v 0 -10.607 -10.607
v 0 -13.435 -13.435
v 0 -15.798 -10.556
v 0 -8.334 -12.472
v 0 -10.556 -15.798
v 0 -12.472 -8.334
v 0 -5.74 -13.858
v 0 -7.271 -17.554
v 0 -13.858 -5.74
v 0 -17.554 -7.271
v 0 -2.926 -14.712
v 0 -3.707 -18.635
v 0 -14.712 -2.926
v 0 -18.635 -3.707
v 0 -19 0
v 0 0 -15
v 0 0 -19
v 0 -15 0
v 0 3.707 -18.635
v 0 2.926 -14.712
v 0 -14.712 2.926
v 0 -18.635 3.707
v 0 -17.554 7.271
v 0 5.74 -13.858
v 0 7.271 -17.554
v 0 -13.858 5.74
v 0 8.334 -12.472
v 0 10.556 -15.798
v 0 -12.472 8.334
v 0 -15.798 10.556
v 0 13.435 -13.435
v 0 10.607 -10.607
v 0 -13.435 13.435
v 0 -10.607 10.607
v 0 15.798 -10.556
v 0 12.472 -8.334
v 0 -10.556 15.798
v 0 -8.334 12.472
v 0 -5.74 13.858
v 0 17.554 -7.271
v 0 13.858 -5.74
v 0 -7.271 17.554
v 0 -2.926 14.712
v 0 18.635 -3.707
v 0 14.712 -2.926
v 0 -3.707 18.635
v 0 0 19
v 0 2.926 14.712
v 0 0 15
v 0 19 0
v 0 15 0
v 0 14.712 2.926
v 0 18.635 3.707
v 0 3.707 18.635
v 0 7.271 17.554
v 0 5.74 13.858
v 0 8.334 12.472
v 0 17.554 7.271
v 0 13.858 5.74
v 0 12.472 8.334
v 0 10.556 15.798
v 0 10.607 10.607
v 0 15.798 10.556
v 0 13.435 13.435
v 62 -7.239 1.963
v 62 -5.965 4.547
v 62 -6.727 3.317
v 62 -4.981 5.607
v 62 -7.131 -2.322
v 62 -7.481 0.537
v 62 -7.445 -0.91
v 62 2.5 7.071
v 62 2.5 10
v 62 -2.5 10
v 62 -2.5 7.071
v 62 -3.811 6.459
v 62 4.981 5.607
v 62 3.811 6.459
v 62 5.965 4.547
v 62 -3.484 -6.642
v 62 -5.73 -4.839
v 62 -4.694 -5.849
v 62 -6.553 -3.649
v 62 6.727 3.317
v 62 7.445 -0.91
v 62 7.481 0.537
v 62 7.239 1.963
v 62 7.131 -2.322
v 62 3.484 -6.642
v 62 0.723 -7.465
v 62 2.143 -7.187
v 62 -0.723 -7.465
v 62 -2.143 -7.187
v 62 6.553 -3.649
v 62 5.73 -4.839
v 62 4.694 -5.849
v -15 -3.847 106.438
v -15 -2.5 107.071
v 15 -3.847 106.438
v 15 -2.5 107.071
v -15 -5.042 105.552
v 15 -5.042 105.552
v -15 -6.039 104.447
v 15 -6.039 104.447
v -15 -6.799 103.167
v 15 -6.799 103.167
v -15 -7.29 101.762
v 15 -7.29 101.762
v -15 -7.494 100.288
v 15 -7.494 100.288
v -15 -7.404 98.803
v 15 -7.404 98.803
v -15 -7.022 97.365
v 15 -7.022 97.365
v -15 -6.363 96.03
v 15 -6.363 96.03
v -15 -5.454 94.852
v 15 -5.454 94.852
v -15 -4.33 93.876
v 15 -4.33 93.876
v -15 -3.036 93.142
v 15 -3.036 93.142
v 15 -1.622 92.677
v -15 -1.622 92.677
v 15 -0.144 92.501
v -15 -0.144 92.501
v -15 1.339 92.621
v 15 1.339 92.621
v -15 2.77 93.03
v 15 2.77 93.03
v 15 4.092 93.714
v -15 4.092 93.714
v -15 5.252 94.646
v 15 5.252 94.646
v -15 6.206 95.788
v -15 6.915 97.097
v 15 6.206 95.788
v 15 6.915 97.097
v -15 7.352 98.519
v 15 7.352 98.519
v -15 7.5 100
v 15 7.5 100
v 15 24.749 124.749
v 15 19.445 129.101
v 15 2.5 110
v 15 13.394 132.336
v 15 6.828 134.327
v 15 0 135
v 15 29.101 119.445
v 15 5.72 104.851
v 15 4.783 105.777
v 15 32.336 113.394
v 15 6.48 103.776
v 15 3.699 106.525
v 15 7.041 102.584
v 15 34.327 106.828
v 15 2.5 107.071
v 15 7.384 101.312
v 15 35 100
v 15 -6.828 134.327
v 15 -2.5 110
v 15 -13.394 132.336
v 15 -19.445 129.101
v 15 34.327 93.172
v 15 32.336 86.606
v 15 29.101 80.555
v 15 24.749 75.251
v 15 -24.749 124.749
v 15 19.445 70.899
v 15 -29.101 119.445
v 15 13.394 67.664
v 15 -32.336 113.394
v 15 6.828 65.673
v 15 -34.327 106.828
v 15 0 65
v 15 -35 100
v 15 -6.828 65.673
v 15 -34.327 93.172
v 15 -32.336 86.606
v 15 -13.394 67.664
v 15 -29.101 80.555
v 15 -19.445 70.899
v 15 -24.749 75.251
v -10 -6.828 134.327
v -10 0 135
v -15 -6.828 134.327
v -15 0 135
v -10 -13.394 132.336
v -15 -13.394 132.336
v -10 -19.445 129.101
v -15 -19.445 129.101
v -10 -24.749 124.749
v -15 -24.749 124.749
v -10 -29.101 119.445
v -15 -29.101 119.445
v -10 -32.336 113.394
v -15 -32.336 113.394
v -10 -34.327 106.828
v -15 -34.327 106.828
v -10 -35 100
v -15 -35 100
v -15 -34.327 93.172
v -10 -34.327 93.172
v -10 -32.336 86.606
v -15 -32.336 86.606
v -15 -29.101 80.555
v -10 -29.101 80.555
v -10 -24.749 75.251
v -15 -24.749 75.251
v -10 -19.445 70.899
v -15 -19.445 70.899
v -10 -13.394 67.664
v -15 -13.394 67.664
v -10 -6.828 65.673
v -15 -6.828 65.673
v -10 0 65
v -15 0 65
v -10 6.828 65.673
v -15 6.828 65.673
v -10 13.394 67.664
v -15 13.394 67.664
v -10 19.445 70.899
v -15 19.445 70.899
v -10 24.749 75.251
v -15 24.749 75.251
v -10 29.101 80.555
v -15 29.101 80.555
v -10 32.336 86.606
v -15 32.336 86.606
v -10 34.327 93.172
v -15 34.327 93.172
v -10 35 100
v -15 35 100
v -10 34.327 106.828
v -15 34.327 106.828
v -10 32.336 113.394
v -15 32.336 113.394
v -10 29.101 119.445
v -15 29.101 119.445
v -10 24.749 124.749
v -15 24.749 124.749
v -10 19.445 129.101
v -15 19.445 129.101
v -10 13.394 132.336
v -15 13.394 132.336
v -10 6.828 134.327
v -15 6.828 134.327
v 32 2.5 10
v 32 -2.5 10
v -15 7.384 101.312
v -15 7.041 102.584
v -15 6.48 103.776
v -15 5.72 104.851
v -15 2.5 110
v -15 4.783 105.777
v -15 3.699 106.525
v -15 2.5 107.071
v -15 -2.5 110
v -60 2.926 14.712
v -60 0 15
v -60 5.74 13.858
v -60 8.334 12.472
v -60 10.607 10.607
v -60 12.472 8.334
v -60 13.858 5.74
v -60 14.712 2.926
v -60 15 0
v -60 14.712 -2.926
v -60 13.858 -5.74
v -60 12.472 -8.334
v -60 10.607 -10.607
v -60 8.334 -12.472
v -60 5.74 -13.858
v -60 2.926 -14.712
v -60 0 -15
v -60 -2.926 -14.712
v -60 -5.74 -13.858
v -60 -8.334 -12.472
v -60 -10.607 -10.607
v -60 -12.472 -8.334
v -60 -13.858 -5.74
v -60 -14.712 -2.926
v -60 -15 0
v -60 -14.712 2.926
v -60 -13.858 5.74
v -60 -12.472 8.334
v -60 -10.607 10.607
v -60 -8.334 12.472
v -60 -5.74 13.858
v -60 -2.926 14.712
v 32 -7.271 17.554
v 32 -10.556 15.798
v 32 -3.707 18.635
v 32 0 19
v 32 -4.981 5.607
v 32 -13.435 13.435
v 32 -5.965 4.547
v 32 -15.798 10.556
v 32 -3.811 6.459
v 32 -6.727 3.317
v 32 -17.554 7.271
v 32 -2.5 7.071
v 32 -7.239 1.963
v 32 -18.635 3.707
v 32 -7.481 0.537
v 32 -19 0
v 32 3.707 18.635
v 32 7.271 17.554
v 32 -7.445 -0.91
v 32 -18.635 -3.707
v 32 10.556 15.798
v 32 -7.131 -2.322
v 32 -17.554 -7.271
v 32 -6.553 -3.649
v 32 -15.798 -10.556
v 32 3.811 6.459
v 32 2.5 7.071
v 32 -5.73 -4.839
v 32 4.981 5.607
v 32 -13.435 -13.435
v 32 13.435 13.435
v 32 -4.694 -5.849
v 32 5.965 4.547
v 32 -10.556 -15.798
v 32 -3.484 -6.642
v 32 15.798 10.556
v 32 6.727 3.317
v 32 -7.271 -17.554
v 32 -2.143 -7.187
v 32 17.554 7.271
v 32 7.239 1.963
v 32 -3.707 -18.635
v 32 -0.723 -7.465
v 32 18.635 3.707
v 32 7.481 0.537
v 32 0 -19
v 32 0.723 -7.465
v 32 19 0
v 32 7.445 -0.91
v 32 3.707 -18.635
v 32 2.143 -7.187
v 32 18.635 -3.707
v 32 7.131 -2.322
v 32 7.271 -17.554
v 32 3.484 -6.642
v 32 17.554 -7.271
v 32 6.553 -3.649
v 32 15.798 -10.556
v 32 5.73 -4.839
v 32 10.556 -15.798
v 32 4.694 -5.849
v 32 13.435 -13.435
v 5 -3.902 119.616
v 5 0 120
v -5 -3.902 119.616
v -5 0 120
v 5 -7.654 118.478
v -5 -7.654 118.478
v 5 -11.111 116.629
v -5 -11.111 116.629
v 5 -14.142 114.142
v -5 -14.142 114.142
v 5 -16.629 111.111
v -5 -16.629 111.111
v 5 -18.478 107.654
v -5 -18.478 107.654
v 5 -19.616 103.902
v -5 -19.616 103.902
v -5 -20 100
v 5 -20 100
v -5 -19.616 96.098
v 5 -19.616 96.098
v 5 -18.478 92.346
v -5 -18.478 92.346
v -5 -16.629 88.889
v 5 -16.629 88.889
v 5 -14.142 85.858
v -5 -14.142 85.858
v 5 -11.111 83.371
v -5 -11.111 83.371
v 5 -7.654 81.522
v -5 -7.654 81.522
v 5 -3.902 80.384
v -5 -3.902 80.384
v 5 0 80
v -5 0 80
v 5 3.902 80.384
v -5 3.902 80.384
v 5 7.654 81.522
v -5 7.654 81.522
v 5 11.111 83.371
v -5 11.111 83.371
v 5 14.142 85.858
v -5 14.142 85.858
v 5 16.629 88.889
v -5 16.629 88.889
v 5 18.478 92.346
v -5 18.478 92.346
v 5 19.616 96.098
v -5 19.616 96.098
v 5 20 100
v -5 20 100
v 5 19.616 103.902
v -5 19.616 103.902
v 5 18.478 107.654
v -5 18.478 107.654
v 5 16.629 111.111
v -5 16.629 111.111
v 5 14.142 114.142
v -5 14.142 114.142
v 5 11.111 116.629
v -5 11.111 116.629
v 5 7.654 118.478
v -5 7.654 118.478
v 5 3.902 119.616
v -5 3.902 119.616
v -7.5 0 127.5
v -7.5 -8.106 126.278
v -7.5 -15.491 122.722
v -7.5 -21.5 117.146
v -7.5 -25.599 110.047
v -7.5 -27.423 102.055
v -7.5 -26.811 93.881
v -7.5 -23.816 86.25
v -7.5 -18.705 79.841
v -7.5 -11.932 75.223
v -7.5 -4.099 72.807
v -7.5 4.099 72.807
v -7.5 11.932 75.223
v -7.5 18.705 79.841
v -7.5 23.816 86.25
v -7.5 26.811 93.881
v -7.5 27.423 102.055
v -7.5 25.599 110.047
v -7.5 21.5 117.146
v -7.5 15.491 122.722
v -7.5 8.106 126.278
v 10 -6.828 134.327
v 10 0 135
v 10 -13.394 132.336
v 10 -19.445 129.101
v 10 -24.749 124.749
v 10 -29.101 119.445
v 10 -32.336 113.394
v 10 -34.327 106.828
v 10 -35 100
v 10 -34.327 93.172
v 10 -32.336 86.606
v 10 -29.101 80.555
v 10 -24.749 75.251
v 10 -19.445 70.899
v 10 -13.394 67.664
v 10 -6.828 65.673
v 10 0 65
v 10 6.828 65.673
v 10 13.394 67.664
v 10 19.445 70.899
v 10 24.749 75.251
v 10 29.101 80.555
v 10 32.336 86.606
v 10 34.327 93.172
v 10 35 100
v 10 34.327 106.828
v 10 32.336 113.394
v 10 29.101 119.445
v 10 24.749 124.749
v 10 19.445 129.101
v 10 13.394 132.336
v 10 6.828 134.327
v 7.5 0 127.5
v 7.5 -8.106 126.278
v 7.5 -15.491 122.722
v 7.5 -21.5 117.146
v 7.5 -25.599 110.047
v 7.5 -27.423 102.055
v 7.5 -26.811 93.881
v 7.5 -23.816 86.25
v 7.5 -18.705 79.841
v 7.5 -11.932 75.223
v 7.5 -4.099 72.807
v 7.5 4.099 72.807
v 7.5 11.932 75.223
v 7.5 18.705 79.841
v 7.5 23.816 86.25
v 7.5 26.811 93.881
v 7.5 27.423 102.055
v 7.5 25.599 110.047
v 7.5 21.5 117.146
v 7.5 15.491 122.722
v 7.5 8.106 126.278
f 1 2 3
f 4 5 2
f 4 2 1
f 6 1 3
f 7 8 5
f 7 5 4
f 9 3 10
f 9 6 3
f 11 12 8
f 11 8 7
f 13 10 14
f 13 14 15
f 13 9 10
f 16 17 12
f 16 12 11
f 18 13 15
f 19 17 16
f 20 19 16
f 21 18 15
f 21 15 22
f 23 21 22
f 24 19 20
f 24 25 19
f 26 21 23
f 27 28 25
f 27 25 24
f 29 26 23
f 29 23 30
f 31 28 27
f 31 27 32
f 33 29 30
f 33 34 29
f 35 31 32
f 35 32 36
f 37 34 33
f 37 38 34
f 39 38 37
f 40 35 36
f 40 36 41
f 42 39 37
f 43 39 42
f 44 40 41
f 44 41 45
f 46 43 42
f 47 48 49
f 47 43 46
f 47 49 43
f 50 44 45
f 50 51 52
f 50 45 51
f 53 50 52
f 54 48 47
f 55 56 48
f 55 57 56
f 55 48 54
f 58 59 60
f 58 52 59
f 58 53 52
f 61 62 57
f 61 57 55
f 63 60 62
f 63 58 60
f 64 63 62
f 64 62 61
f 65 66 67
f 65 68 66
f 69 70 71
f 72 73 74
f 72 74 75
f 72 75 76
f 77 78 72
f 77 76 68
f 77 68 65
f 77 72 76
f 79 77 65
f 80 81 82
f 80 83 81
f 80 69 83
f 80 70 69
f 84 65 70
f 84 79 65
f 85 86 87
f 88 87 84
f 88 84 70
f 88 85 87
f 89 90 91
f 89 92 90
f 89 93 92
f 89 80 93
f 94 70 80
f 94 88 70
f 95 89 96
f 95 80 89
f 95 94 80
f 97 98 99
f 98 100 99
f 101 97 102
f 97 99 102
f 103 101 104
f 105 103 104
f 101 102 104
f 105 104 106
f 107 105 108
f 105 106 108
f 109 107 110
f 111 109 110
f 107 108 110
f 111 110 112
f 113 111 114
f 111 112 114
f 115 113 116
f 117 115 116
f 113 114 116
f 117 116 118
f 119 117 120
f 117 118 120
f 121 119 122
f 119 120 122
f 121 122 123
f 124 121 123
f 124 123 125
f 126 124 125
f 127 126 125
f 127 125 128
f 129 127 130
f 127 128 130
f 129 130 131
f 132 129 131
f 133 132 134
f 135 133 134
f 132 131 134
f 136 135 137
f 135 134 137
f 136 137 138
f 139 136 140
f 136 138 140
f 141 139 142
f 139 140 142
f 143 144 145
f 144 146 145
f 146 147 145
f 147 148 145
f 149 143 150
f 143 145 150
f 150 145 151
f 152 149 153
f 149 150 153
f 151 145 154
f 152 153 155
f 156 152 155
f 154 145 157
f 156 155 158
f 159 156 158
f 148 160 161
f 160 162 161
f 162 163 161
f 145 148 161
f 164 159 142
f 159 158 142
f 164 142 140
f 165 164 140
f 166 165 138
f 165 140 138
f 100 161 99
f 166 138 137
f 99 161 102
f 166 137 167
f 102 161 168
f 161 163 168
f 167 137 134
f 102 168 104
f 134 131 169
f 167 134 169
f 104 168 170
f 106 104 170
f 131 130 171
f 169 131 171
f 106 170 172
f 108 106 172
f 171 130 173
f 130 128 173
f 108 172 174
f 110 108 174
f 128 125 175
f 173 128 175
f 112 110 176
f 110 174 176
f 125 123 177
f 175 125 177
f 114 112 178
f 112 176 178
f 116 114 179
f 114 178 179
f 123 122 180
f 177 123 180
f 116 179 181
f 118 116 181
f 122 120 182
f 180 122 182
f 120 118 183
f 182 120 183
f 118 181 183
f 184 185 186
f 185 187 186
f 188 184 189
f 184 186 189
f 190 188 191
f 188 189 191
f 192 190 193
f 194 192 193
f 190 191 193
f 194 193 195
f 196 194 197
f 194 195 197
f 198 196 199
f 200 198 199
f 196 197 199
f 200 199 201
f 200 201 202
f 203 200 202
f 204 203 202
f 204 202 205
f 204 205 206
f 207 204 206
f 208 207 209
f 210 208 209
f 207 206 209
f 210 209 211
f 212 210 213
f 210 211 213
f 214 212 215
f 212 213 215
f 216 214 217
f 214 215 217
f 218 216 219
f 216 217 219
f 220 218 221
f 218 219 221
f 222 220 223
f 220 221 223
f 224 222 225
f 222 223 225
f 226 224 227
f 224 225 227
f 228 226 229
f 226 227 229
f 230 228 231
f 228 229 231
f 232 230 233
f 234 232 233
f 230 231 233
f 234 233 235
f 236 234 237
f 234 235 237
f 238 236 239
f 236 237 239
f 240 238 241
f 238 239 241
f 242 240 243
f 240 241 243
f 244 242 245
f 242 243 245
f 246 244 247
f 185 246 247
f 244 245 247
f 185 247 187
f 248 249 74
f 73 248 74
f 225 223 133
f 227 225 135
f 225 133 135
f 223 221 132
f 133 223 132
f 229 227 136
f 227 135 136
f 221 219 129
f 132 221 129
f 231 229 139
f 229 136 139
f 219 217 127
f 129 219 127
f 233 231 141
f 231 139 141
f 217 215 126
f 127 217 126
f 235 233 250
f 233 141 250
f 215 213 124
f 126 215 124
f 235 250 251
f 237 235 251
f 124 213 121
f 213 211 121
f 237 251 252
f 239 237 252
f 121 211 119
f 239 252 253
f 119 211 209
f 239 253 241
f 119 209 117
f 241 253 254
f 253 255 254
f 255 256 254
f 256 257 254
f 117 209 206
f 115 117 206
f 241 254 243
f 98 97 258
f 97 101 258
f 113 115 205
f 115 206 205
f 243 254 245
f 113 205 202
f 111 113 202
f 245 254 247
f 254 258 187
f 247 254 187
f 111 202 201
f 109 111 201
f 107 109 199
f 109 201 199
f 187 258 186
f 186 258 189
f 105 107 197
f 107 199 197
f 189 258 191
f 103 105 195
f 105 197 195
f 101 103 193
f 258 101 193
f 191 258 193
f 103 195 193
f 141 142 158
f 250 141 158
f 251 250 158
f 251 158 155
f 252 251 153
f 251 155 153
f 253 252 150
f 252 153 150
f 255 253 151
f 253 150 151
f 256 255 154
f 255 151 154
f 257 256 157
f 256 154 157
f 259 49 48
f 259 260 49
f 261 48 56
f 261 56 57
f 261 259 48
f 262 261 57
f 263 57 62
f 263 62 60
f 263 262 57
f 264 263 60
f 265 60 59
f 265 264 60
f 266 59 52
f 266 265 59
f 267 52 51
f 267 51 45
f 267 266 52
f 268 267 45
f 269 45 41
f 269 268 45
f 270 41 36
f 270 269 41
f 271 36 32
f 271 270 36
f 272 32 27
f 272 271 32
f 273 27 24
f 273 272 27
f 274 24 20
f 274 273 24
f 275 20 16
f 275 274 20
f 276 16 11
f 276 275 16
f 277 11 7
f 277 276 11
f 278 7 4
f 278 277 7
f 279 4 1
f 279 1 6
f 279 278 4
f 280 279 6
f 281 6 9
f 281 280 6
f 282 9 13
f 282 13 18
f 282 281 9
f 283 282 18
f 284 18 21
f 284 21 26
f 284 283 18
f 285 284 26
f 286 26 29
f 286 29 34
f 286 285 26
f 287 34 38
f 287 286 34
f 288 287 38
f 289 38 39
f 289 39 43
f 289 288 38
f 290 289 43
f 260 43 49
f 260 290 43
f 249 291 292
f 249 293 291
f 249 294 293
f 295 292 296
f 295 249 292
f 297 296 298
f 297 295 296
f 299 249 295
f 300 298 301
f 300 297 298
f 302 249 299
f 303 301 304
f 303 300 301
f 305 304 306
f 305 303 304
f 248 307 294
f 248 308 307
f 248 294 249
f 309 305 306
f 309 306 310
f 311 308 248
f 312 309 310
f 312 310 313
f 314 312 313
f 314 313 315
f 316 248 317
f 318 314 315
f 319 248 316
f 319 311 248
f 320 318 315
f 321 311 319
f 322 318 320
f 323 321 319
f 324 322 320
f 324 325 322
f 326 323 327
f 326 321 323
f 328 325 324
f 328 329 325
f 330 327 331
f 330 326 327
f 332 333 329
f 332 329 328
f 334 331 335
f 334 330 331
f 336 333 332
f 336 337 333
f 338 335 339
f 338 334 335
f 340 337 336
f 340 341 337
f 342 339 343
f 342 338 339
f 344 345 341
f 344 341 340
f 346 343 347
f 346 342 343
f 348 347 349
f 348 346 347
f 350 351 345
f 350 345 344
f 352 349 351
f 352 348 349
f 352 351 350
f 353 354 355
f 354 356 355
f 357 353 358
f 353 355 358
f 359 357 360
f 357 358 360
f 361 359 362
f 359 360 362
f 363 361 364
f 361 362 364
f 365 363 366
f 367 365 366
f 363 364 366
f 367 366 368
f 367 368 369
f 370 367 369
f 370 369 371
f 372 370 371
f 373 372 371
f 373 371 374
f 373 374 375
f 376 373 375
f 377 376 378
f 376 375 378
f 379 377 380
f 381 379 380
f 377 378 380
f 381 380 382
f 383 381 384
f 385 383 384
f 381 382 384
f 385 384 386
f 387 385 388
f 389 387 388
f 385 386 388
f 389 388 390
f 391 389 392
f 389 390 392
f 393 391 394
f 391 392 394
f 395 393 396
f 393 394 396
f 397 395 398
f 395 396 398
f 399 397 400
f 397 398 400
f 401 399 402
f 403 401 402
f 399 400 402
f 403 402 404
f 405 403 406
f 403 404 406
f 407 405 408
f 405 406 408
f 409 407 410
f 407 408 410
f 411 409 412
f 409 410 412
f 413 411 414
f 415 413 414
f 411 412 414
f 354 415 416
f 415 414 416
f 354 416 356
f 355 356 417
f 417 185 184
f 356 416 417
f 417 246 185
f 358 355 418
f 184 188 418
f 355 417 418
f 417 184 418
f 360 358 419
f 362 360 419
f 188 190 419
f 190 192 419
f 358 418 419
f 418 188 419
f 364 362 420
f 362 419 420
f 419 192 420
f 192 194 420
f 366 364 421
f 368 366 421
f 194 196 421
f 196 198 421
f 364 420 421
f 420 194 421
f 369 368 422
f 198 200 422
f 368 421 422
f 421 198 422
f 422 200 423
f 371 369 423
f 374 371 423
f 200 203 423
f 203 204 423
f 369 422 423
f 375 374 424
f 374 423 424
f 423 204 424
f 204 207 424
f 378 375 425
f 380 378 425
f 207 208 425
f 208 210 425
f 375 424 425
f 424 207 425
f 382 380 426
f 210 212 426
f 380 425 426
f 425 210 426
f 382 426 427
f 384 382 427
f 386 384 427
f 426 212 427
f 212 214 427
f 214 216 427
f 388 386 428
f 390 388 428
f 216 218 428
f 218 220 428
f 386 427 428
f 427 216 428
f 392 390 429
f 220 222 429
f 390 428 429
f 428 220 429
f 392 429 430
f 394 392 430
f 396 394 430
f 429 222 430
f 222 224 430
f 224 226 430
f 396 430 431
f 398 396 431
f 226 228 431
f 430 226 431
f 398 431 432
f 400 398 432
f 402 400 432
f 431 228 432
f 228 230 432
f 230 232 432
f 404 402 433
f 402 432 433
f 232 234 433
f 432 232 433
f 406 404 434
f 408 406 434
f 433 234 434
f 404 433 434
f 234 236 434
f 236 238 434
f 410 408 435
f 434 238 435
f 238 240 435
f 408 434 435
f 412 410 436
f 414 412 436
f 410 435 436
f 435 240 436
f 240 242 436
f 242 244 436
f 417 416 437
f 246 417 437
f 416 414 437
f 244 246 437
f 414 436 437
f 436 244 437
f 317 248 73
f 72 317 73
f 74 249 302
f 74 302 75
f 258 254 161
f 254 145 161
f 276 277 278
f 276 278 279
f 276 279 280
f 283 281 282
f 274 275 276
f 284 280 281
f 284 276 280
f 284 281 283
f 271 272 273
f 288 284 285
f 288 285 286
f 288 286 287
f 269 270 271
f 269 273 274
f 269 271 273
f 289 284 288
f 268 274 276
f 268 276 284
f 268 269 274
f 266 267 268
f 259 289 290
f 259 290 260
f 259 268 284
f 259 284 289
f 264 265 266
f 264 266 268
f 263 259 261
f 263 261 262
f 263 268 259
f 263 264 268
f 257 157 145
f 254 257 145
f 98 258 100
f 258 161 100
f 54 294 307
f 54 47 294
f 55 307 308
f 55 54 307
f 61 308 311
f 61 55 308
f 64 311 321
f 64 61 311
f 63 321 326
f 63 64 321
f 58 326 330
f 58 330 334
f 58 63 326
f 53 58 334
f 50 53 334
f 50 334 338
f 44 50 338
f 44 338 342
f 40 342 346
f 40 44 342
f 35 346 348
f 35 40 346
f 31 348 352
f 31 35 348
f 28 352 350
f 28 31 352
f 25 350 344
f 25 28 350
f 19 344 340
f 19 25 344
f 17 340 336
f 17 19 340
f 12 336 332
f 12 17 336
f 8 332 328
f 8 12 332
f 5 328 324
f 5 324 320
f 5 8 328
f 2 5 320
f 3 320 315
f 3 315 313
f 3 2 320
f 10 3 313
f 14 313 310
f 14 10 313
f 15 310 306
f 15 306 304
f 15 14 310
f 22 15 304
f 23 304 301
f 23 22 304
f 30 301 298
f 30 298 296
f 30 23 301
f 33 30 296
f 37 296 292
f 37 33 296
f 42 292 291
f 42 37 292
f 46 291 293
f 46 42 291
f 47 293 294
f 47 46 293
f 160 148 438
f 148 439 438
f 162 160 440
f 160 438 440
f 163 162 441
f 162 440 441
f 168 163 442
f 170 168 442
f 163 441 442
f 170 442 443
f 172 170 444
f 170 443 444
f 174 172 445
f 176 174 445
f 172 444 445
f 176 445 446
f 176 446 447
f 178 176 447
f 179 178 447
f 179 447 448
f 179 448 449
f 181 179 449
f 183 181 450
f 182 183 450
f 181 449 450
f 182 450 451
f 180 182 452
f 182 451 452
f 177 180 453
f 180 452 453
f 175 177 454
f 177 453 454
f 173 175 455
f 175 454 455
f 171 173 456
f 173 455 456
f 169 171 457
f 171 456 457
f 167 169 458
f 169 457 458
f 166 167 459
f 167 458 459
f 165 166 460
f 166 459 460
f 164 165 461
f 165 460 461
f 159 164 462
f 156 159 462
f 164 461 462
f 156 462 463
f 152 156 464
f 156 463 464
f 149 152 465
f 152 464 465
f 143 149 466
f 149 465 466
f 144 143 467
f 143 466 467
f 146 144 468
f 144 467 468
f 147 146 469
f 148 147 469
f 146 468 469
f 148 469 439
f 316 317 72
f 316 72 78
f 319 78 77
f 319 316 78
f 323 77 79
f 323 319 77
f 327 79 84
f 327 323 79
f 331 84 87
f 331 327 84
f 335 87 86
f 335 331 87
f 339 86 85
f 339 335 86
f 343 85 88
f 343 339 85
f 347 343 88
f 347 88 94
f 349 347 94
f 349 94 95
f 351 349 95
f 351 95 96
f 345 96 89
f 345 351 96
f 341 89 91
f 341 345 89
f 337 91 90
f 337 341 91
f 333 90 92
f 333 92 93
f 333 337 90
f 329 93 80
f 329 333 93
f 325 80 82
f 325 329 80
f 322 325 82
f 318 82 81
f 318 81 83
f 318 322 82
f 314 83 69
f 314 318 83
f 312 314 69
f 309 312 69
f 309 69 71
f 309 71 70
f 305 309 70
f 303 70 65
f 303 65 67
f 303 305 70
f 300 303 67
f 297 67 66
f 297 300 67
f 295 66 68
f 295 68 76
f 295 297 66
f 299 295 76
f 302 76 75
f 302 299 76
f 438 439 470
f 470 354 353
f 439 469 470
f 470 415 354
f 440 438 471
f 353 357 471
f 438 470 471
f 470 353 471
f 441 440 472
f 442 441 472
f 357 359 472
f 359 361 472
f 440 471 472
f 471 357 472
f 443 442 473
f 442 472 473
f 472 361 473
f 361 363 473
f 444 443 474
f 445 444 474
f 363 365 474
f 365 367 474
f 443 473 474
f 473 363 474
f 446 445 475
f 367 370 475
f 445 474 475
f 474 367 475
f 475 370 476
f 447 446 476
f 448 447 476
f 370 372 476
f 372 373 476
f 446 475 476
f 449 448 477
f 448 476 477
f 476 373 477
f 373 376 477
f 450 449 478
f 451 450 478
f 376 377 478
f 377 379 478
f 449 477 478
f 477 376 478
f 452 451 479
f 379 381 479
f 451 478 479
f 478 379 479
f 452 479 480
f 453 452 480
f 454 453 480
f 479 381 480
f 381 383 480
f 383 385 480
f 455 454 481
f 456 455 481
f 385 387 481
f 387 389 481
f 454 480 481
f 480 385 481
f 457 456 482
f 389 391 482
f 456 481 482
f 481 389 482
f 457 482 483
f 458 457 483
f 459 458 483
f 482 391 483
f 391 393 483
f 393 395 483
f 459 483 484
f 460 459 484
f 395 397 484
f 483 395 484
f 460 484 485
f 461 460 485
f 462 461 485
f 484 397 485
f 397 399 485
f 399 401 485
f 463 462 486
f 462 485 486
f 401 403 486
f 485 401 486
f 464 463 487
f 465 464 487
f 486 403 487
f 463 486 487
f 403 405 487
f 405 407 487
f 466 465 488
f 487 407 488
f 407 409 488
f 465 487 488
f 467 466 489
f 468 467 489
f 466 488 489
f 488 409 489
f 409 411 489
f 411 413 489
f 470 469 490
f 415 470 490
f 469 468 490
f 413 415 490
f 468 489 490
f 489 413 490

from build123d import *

# Parameters (mm, degrees)
F1_W     = 62
F1_H     = 10
F3_DEPTH = 2.5
F6_DEPTH = 15


with BuildPart() as f2:
    # F0 (on Front) → F2 (revolve)
    with BuildSketch(Plane.XZ):
        Polygon((-60, 15), (-60, 0), (0, 0), (62, 0), (62, 7.5), (32, 7.5), (32, 19), (0, 19), (0, 15), align=None)
    revolve(axis=Axis((-30, 0, 0), (-1, 0, 0)))

    # F1 (on Front) → F3 (join, symmetric)
    with BuildSketch(Plane.XZ):
        with Locations((31, 5)):
            Rectangle(F1_W, F1_H)
    extrude(amount=F3_DEPTH, both=True)


with BuildPart() as f4:
    # F0 (on Front) → F4 (revolve)
    with BuildSketch(Plane.XZ):
        Polygon((-10, 135), (-15, 135), (-15, 100), (15, 100), (15, 135), (10, 135), (5, 120), (-5, 120), align=None)
    revolve(axis=Axis((0, 0, 100), (1, 0, 0)))

    # F5 (on Right) → F6 (cut, symmetric)
    with BuildSketch(Plane.YZ):
        with BuildLine():
            ThreePointArc((-2.5, 107.071068), (-4.330127, 93.876276), (7.5, 100))
            ThreePointArc((7.5, 100), (6.123724, 104.330127), (2.5, 107.071068))
            ThreePointArc((2.5, 107.071068), (0, 107.5), (-2.5, 107.071068))
        make_face()
        with BuildLine():
            ThreePointArc((-2.5, 107.071068), (0, 107.5), (2.5, 107.071068))
            Line((2.5, 107.071068), (2.5, 110))
            Line((2.5, 110), (-2.5, 110))
            Line((-2.5, 110), (-2.5, 107.071068))
        make_face()
    extrude(amount=F6_DEPTH, both=True, mode=Mode.SUBTRACT)


solid = Compound([f2.part, f4.part])
